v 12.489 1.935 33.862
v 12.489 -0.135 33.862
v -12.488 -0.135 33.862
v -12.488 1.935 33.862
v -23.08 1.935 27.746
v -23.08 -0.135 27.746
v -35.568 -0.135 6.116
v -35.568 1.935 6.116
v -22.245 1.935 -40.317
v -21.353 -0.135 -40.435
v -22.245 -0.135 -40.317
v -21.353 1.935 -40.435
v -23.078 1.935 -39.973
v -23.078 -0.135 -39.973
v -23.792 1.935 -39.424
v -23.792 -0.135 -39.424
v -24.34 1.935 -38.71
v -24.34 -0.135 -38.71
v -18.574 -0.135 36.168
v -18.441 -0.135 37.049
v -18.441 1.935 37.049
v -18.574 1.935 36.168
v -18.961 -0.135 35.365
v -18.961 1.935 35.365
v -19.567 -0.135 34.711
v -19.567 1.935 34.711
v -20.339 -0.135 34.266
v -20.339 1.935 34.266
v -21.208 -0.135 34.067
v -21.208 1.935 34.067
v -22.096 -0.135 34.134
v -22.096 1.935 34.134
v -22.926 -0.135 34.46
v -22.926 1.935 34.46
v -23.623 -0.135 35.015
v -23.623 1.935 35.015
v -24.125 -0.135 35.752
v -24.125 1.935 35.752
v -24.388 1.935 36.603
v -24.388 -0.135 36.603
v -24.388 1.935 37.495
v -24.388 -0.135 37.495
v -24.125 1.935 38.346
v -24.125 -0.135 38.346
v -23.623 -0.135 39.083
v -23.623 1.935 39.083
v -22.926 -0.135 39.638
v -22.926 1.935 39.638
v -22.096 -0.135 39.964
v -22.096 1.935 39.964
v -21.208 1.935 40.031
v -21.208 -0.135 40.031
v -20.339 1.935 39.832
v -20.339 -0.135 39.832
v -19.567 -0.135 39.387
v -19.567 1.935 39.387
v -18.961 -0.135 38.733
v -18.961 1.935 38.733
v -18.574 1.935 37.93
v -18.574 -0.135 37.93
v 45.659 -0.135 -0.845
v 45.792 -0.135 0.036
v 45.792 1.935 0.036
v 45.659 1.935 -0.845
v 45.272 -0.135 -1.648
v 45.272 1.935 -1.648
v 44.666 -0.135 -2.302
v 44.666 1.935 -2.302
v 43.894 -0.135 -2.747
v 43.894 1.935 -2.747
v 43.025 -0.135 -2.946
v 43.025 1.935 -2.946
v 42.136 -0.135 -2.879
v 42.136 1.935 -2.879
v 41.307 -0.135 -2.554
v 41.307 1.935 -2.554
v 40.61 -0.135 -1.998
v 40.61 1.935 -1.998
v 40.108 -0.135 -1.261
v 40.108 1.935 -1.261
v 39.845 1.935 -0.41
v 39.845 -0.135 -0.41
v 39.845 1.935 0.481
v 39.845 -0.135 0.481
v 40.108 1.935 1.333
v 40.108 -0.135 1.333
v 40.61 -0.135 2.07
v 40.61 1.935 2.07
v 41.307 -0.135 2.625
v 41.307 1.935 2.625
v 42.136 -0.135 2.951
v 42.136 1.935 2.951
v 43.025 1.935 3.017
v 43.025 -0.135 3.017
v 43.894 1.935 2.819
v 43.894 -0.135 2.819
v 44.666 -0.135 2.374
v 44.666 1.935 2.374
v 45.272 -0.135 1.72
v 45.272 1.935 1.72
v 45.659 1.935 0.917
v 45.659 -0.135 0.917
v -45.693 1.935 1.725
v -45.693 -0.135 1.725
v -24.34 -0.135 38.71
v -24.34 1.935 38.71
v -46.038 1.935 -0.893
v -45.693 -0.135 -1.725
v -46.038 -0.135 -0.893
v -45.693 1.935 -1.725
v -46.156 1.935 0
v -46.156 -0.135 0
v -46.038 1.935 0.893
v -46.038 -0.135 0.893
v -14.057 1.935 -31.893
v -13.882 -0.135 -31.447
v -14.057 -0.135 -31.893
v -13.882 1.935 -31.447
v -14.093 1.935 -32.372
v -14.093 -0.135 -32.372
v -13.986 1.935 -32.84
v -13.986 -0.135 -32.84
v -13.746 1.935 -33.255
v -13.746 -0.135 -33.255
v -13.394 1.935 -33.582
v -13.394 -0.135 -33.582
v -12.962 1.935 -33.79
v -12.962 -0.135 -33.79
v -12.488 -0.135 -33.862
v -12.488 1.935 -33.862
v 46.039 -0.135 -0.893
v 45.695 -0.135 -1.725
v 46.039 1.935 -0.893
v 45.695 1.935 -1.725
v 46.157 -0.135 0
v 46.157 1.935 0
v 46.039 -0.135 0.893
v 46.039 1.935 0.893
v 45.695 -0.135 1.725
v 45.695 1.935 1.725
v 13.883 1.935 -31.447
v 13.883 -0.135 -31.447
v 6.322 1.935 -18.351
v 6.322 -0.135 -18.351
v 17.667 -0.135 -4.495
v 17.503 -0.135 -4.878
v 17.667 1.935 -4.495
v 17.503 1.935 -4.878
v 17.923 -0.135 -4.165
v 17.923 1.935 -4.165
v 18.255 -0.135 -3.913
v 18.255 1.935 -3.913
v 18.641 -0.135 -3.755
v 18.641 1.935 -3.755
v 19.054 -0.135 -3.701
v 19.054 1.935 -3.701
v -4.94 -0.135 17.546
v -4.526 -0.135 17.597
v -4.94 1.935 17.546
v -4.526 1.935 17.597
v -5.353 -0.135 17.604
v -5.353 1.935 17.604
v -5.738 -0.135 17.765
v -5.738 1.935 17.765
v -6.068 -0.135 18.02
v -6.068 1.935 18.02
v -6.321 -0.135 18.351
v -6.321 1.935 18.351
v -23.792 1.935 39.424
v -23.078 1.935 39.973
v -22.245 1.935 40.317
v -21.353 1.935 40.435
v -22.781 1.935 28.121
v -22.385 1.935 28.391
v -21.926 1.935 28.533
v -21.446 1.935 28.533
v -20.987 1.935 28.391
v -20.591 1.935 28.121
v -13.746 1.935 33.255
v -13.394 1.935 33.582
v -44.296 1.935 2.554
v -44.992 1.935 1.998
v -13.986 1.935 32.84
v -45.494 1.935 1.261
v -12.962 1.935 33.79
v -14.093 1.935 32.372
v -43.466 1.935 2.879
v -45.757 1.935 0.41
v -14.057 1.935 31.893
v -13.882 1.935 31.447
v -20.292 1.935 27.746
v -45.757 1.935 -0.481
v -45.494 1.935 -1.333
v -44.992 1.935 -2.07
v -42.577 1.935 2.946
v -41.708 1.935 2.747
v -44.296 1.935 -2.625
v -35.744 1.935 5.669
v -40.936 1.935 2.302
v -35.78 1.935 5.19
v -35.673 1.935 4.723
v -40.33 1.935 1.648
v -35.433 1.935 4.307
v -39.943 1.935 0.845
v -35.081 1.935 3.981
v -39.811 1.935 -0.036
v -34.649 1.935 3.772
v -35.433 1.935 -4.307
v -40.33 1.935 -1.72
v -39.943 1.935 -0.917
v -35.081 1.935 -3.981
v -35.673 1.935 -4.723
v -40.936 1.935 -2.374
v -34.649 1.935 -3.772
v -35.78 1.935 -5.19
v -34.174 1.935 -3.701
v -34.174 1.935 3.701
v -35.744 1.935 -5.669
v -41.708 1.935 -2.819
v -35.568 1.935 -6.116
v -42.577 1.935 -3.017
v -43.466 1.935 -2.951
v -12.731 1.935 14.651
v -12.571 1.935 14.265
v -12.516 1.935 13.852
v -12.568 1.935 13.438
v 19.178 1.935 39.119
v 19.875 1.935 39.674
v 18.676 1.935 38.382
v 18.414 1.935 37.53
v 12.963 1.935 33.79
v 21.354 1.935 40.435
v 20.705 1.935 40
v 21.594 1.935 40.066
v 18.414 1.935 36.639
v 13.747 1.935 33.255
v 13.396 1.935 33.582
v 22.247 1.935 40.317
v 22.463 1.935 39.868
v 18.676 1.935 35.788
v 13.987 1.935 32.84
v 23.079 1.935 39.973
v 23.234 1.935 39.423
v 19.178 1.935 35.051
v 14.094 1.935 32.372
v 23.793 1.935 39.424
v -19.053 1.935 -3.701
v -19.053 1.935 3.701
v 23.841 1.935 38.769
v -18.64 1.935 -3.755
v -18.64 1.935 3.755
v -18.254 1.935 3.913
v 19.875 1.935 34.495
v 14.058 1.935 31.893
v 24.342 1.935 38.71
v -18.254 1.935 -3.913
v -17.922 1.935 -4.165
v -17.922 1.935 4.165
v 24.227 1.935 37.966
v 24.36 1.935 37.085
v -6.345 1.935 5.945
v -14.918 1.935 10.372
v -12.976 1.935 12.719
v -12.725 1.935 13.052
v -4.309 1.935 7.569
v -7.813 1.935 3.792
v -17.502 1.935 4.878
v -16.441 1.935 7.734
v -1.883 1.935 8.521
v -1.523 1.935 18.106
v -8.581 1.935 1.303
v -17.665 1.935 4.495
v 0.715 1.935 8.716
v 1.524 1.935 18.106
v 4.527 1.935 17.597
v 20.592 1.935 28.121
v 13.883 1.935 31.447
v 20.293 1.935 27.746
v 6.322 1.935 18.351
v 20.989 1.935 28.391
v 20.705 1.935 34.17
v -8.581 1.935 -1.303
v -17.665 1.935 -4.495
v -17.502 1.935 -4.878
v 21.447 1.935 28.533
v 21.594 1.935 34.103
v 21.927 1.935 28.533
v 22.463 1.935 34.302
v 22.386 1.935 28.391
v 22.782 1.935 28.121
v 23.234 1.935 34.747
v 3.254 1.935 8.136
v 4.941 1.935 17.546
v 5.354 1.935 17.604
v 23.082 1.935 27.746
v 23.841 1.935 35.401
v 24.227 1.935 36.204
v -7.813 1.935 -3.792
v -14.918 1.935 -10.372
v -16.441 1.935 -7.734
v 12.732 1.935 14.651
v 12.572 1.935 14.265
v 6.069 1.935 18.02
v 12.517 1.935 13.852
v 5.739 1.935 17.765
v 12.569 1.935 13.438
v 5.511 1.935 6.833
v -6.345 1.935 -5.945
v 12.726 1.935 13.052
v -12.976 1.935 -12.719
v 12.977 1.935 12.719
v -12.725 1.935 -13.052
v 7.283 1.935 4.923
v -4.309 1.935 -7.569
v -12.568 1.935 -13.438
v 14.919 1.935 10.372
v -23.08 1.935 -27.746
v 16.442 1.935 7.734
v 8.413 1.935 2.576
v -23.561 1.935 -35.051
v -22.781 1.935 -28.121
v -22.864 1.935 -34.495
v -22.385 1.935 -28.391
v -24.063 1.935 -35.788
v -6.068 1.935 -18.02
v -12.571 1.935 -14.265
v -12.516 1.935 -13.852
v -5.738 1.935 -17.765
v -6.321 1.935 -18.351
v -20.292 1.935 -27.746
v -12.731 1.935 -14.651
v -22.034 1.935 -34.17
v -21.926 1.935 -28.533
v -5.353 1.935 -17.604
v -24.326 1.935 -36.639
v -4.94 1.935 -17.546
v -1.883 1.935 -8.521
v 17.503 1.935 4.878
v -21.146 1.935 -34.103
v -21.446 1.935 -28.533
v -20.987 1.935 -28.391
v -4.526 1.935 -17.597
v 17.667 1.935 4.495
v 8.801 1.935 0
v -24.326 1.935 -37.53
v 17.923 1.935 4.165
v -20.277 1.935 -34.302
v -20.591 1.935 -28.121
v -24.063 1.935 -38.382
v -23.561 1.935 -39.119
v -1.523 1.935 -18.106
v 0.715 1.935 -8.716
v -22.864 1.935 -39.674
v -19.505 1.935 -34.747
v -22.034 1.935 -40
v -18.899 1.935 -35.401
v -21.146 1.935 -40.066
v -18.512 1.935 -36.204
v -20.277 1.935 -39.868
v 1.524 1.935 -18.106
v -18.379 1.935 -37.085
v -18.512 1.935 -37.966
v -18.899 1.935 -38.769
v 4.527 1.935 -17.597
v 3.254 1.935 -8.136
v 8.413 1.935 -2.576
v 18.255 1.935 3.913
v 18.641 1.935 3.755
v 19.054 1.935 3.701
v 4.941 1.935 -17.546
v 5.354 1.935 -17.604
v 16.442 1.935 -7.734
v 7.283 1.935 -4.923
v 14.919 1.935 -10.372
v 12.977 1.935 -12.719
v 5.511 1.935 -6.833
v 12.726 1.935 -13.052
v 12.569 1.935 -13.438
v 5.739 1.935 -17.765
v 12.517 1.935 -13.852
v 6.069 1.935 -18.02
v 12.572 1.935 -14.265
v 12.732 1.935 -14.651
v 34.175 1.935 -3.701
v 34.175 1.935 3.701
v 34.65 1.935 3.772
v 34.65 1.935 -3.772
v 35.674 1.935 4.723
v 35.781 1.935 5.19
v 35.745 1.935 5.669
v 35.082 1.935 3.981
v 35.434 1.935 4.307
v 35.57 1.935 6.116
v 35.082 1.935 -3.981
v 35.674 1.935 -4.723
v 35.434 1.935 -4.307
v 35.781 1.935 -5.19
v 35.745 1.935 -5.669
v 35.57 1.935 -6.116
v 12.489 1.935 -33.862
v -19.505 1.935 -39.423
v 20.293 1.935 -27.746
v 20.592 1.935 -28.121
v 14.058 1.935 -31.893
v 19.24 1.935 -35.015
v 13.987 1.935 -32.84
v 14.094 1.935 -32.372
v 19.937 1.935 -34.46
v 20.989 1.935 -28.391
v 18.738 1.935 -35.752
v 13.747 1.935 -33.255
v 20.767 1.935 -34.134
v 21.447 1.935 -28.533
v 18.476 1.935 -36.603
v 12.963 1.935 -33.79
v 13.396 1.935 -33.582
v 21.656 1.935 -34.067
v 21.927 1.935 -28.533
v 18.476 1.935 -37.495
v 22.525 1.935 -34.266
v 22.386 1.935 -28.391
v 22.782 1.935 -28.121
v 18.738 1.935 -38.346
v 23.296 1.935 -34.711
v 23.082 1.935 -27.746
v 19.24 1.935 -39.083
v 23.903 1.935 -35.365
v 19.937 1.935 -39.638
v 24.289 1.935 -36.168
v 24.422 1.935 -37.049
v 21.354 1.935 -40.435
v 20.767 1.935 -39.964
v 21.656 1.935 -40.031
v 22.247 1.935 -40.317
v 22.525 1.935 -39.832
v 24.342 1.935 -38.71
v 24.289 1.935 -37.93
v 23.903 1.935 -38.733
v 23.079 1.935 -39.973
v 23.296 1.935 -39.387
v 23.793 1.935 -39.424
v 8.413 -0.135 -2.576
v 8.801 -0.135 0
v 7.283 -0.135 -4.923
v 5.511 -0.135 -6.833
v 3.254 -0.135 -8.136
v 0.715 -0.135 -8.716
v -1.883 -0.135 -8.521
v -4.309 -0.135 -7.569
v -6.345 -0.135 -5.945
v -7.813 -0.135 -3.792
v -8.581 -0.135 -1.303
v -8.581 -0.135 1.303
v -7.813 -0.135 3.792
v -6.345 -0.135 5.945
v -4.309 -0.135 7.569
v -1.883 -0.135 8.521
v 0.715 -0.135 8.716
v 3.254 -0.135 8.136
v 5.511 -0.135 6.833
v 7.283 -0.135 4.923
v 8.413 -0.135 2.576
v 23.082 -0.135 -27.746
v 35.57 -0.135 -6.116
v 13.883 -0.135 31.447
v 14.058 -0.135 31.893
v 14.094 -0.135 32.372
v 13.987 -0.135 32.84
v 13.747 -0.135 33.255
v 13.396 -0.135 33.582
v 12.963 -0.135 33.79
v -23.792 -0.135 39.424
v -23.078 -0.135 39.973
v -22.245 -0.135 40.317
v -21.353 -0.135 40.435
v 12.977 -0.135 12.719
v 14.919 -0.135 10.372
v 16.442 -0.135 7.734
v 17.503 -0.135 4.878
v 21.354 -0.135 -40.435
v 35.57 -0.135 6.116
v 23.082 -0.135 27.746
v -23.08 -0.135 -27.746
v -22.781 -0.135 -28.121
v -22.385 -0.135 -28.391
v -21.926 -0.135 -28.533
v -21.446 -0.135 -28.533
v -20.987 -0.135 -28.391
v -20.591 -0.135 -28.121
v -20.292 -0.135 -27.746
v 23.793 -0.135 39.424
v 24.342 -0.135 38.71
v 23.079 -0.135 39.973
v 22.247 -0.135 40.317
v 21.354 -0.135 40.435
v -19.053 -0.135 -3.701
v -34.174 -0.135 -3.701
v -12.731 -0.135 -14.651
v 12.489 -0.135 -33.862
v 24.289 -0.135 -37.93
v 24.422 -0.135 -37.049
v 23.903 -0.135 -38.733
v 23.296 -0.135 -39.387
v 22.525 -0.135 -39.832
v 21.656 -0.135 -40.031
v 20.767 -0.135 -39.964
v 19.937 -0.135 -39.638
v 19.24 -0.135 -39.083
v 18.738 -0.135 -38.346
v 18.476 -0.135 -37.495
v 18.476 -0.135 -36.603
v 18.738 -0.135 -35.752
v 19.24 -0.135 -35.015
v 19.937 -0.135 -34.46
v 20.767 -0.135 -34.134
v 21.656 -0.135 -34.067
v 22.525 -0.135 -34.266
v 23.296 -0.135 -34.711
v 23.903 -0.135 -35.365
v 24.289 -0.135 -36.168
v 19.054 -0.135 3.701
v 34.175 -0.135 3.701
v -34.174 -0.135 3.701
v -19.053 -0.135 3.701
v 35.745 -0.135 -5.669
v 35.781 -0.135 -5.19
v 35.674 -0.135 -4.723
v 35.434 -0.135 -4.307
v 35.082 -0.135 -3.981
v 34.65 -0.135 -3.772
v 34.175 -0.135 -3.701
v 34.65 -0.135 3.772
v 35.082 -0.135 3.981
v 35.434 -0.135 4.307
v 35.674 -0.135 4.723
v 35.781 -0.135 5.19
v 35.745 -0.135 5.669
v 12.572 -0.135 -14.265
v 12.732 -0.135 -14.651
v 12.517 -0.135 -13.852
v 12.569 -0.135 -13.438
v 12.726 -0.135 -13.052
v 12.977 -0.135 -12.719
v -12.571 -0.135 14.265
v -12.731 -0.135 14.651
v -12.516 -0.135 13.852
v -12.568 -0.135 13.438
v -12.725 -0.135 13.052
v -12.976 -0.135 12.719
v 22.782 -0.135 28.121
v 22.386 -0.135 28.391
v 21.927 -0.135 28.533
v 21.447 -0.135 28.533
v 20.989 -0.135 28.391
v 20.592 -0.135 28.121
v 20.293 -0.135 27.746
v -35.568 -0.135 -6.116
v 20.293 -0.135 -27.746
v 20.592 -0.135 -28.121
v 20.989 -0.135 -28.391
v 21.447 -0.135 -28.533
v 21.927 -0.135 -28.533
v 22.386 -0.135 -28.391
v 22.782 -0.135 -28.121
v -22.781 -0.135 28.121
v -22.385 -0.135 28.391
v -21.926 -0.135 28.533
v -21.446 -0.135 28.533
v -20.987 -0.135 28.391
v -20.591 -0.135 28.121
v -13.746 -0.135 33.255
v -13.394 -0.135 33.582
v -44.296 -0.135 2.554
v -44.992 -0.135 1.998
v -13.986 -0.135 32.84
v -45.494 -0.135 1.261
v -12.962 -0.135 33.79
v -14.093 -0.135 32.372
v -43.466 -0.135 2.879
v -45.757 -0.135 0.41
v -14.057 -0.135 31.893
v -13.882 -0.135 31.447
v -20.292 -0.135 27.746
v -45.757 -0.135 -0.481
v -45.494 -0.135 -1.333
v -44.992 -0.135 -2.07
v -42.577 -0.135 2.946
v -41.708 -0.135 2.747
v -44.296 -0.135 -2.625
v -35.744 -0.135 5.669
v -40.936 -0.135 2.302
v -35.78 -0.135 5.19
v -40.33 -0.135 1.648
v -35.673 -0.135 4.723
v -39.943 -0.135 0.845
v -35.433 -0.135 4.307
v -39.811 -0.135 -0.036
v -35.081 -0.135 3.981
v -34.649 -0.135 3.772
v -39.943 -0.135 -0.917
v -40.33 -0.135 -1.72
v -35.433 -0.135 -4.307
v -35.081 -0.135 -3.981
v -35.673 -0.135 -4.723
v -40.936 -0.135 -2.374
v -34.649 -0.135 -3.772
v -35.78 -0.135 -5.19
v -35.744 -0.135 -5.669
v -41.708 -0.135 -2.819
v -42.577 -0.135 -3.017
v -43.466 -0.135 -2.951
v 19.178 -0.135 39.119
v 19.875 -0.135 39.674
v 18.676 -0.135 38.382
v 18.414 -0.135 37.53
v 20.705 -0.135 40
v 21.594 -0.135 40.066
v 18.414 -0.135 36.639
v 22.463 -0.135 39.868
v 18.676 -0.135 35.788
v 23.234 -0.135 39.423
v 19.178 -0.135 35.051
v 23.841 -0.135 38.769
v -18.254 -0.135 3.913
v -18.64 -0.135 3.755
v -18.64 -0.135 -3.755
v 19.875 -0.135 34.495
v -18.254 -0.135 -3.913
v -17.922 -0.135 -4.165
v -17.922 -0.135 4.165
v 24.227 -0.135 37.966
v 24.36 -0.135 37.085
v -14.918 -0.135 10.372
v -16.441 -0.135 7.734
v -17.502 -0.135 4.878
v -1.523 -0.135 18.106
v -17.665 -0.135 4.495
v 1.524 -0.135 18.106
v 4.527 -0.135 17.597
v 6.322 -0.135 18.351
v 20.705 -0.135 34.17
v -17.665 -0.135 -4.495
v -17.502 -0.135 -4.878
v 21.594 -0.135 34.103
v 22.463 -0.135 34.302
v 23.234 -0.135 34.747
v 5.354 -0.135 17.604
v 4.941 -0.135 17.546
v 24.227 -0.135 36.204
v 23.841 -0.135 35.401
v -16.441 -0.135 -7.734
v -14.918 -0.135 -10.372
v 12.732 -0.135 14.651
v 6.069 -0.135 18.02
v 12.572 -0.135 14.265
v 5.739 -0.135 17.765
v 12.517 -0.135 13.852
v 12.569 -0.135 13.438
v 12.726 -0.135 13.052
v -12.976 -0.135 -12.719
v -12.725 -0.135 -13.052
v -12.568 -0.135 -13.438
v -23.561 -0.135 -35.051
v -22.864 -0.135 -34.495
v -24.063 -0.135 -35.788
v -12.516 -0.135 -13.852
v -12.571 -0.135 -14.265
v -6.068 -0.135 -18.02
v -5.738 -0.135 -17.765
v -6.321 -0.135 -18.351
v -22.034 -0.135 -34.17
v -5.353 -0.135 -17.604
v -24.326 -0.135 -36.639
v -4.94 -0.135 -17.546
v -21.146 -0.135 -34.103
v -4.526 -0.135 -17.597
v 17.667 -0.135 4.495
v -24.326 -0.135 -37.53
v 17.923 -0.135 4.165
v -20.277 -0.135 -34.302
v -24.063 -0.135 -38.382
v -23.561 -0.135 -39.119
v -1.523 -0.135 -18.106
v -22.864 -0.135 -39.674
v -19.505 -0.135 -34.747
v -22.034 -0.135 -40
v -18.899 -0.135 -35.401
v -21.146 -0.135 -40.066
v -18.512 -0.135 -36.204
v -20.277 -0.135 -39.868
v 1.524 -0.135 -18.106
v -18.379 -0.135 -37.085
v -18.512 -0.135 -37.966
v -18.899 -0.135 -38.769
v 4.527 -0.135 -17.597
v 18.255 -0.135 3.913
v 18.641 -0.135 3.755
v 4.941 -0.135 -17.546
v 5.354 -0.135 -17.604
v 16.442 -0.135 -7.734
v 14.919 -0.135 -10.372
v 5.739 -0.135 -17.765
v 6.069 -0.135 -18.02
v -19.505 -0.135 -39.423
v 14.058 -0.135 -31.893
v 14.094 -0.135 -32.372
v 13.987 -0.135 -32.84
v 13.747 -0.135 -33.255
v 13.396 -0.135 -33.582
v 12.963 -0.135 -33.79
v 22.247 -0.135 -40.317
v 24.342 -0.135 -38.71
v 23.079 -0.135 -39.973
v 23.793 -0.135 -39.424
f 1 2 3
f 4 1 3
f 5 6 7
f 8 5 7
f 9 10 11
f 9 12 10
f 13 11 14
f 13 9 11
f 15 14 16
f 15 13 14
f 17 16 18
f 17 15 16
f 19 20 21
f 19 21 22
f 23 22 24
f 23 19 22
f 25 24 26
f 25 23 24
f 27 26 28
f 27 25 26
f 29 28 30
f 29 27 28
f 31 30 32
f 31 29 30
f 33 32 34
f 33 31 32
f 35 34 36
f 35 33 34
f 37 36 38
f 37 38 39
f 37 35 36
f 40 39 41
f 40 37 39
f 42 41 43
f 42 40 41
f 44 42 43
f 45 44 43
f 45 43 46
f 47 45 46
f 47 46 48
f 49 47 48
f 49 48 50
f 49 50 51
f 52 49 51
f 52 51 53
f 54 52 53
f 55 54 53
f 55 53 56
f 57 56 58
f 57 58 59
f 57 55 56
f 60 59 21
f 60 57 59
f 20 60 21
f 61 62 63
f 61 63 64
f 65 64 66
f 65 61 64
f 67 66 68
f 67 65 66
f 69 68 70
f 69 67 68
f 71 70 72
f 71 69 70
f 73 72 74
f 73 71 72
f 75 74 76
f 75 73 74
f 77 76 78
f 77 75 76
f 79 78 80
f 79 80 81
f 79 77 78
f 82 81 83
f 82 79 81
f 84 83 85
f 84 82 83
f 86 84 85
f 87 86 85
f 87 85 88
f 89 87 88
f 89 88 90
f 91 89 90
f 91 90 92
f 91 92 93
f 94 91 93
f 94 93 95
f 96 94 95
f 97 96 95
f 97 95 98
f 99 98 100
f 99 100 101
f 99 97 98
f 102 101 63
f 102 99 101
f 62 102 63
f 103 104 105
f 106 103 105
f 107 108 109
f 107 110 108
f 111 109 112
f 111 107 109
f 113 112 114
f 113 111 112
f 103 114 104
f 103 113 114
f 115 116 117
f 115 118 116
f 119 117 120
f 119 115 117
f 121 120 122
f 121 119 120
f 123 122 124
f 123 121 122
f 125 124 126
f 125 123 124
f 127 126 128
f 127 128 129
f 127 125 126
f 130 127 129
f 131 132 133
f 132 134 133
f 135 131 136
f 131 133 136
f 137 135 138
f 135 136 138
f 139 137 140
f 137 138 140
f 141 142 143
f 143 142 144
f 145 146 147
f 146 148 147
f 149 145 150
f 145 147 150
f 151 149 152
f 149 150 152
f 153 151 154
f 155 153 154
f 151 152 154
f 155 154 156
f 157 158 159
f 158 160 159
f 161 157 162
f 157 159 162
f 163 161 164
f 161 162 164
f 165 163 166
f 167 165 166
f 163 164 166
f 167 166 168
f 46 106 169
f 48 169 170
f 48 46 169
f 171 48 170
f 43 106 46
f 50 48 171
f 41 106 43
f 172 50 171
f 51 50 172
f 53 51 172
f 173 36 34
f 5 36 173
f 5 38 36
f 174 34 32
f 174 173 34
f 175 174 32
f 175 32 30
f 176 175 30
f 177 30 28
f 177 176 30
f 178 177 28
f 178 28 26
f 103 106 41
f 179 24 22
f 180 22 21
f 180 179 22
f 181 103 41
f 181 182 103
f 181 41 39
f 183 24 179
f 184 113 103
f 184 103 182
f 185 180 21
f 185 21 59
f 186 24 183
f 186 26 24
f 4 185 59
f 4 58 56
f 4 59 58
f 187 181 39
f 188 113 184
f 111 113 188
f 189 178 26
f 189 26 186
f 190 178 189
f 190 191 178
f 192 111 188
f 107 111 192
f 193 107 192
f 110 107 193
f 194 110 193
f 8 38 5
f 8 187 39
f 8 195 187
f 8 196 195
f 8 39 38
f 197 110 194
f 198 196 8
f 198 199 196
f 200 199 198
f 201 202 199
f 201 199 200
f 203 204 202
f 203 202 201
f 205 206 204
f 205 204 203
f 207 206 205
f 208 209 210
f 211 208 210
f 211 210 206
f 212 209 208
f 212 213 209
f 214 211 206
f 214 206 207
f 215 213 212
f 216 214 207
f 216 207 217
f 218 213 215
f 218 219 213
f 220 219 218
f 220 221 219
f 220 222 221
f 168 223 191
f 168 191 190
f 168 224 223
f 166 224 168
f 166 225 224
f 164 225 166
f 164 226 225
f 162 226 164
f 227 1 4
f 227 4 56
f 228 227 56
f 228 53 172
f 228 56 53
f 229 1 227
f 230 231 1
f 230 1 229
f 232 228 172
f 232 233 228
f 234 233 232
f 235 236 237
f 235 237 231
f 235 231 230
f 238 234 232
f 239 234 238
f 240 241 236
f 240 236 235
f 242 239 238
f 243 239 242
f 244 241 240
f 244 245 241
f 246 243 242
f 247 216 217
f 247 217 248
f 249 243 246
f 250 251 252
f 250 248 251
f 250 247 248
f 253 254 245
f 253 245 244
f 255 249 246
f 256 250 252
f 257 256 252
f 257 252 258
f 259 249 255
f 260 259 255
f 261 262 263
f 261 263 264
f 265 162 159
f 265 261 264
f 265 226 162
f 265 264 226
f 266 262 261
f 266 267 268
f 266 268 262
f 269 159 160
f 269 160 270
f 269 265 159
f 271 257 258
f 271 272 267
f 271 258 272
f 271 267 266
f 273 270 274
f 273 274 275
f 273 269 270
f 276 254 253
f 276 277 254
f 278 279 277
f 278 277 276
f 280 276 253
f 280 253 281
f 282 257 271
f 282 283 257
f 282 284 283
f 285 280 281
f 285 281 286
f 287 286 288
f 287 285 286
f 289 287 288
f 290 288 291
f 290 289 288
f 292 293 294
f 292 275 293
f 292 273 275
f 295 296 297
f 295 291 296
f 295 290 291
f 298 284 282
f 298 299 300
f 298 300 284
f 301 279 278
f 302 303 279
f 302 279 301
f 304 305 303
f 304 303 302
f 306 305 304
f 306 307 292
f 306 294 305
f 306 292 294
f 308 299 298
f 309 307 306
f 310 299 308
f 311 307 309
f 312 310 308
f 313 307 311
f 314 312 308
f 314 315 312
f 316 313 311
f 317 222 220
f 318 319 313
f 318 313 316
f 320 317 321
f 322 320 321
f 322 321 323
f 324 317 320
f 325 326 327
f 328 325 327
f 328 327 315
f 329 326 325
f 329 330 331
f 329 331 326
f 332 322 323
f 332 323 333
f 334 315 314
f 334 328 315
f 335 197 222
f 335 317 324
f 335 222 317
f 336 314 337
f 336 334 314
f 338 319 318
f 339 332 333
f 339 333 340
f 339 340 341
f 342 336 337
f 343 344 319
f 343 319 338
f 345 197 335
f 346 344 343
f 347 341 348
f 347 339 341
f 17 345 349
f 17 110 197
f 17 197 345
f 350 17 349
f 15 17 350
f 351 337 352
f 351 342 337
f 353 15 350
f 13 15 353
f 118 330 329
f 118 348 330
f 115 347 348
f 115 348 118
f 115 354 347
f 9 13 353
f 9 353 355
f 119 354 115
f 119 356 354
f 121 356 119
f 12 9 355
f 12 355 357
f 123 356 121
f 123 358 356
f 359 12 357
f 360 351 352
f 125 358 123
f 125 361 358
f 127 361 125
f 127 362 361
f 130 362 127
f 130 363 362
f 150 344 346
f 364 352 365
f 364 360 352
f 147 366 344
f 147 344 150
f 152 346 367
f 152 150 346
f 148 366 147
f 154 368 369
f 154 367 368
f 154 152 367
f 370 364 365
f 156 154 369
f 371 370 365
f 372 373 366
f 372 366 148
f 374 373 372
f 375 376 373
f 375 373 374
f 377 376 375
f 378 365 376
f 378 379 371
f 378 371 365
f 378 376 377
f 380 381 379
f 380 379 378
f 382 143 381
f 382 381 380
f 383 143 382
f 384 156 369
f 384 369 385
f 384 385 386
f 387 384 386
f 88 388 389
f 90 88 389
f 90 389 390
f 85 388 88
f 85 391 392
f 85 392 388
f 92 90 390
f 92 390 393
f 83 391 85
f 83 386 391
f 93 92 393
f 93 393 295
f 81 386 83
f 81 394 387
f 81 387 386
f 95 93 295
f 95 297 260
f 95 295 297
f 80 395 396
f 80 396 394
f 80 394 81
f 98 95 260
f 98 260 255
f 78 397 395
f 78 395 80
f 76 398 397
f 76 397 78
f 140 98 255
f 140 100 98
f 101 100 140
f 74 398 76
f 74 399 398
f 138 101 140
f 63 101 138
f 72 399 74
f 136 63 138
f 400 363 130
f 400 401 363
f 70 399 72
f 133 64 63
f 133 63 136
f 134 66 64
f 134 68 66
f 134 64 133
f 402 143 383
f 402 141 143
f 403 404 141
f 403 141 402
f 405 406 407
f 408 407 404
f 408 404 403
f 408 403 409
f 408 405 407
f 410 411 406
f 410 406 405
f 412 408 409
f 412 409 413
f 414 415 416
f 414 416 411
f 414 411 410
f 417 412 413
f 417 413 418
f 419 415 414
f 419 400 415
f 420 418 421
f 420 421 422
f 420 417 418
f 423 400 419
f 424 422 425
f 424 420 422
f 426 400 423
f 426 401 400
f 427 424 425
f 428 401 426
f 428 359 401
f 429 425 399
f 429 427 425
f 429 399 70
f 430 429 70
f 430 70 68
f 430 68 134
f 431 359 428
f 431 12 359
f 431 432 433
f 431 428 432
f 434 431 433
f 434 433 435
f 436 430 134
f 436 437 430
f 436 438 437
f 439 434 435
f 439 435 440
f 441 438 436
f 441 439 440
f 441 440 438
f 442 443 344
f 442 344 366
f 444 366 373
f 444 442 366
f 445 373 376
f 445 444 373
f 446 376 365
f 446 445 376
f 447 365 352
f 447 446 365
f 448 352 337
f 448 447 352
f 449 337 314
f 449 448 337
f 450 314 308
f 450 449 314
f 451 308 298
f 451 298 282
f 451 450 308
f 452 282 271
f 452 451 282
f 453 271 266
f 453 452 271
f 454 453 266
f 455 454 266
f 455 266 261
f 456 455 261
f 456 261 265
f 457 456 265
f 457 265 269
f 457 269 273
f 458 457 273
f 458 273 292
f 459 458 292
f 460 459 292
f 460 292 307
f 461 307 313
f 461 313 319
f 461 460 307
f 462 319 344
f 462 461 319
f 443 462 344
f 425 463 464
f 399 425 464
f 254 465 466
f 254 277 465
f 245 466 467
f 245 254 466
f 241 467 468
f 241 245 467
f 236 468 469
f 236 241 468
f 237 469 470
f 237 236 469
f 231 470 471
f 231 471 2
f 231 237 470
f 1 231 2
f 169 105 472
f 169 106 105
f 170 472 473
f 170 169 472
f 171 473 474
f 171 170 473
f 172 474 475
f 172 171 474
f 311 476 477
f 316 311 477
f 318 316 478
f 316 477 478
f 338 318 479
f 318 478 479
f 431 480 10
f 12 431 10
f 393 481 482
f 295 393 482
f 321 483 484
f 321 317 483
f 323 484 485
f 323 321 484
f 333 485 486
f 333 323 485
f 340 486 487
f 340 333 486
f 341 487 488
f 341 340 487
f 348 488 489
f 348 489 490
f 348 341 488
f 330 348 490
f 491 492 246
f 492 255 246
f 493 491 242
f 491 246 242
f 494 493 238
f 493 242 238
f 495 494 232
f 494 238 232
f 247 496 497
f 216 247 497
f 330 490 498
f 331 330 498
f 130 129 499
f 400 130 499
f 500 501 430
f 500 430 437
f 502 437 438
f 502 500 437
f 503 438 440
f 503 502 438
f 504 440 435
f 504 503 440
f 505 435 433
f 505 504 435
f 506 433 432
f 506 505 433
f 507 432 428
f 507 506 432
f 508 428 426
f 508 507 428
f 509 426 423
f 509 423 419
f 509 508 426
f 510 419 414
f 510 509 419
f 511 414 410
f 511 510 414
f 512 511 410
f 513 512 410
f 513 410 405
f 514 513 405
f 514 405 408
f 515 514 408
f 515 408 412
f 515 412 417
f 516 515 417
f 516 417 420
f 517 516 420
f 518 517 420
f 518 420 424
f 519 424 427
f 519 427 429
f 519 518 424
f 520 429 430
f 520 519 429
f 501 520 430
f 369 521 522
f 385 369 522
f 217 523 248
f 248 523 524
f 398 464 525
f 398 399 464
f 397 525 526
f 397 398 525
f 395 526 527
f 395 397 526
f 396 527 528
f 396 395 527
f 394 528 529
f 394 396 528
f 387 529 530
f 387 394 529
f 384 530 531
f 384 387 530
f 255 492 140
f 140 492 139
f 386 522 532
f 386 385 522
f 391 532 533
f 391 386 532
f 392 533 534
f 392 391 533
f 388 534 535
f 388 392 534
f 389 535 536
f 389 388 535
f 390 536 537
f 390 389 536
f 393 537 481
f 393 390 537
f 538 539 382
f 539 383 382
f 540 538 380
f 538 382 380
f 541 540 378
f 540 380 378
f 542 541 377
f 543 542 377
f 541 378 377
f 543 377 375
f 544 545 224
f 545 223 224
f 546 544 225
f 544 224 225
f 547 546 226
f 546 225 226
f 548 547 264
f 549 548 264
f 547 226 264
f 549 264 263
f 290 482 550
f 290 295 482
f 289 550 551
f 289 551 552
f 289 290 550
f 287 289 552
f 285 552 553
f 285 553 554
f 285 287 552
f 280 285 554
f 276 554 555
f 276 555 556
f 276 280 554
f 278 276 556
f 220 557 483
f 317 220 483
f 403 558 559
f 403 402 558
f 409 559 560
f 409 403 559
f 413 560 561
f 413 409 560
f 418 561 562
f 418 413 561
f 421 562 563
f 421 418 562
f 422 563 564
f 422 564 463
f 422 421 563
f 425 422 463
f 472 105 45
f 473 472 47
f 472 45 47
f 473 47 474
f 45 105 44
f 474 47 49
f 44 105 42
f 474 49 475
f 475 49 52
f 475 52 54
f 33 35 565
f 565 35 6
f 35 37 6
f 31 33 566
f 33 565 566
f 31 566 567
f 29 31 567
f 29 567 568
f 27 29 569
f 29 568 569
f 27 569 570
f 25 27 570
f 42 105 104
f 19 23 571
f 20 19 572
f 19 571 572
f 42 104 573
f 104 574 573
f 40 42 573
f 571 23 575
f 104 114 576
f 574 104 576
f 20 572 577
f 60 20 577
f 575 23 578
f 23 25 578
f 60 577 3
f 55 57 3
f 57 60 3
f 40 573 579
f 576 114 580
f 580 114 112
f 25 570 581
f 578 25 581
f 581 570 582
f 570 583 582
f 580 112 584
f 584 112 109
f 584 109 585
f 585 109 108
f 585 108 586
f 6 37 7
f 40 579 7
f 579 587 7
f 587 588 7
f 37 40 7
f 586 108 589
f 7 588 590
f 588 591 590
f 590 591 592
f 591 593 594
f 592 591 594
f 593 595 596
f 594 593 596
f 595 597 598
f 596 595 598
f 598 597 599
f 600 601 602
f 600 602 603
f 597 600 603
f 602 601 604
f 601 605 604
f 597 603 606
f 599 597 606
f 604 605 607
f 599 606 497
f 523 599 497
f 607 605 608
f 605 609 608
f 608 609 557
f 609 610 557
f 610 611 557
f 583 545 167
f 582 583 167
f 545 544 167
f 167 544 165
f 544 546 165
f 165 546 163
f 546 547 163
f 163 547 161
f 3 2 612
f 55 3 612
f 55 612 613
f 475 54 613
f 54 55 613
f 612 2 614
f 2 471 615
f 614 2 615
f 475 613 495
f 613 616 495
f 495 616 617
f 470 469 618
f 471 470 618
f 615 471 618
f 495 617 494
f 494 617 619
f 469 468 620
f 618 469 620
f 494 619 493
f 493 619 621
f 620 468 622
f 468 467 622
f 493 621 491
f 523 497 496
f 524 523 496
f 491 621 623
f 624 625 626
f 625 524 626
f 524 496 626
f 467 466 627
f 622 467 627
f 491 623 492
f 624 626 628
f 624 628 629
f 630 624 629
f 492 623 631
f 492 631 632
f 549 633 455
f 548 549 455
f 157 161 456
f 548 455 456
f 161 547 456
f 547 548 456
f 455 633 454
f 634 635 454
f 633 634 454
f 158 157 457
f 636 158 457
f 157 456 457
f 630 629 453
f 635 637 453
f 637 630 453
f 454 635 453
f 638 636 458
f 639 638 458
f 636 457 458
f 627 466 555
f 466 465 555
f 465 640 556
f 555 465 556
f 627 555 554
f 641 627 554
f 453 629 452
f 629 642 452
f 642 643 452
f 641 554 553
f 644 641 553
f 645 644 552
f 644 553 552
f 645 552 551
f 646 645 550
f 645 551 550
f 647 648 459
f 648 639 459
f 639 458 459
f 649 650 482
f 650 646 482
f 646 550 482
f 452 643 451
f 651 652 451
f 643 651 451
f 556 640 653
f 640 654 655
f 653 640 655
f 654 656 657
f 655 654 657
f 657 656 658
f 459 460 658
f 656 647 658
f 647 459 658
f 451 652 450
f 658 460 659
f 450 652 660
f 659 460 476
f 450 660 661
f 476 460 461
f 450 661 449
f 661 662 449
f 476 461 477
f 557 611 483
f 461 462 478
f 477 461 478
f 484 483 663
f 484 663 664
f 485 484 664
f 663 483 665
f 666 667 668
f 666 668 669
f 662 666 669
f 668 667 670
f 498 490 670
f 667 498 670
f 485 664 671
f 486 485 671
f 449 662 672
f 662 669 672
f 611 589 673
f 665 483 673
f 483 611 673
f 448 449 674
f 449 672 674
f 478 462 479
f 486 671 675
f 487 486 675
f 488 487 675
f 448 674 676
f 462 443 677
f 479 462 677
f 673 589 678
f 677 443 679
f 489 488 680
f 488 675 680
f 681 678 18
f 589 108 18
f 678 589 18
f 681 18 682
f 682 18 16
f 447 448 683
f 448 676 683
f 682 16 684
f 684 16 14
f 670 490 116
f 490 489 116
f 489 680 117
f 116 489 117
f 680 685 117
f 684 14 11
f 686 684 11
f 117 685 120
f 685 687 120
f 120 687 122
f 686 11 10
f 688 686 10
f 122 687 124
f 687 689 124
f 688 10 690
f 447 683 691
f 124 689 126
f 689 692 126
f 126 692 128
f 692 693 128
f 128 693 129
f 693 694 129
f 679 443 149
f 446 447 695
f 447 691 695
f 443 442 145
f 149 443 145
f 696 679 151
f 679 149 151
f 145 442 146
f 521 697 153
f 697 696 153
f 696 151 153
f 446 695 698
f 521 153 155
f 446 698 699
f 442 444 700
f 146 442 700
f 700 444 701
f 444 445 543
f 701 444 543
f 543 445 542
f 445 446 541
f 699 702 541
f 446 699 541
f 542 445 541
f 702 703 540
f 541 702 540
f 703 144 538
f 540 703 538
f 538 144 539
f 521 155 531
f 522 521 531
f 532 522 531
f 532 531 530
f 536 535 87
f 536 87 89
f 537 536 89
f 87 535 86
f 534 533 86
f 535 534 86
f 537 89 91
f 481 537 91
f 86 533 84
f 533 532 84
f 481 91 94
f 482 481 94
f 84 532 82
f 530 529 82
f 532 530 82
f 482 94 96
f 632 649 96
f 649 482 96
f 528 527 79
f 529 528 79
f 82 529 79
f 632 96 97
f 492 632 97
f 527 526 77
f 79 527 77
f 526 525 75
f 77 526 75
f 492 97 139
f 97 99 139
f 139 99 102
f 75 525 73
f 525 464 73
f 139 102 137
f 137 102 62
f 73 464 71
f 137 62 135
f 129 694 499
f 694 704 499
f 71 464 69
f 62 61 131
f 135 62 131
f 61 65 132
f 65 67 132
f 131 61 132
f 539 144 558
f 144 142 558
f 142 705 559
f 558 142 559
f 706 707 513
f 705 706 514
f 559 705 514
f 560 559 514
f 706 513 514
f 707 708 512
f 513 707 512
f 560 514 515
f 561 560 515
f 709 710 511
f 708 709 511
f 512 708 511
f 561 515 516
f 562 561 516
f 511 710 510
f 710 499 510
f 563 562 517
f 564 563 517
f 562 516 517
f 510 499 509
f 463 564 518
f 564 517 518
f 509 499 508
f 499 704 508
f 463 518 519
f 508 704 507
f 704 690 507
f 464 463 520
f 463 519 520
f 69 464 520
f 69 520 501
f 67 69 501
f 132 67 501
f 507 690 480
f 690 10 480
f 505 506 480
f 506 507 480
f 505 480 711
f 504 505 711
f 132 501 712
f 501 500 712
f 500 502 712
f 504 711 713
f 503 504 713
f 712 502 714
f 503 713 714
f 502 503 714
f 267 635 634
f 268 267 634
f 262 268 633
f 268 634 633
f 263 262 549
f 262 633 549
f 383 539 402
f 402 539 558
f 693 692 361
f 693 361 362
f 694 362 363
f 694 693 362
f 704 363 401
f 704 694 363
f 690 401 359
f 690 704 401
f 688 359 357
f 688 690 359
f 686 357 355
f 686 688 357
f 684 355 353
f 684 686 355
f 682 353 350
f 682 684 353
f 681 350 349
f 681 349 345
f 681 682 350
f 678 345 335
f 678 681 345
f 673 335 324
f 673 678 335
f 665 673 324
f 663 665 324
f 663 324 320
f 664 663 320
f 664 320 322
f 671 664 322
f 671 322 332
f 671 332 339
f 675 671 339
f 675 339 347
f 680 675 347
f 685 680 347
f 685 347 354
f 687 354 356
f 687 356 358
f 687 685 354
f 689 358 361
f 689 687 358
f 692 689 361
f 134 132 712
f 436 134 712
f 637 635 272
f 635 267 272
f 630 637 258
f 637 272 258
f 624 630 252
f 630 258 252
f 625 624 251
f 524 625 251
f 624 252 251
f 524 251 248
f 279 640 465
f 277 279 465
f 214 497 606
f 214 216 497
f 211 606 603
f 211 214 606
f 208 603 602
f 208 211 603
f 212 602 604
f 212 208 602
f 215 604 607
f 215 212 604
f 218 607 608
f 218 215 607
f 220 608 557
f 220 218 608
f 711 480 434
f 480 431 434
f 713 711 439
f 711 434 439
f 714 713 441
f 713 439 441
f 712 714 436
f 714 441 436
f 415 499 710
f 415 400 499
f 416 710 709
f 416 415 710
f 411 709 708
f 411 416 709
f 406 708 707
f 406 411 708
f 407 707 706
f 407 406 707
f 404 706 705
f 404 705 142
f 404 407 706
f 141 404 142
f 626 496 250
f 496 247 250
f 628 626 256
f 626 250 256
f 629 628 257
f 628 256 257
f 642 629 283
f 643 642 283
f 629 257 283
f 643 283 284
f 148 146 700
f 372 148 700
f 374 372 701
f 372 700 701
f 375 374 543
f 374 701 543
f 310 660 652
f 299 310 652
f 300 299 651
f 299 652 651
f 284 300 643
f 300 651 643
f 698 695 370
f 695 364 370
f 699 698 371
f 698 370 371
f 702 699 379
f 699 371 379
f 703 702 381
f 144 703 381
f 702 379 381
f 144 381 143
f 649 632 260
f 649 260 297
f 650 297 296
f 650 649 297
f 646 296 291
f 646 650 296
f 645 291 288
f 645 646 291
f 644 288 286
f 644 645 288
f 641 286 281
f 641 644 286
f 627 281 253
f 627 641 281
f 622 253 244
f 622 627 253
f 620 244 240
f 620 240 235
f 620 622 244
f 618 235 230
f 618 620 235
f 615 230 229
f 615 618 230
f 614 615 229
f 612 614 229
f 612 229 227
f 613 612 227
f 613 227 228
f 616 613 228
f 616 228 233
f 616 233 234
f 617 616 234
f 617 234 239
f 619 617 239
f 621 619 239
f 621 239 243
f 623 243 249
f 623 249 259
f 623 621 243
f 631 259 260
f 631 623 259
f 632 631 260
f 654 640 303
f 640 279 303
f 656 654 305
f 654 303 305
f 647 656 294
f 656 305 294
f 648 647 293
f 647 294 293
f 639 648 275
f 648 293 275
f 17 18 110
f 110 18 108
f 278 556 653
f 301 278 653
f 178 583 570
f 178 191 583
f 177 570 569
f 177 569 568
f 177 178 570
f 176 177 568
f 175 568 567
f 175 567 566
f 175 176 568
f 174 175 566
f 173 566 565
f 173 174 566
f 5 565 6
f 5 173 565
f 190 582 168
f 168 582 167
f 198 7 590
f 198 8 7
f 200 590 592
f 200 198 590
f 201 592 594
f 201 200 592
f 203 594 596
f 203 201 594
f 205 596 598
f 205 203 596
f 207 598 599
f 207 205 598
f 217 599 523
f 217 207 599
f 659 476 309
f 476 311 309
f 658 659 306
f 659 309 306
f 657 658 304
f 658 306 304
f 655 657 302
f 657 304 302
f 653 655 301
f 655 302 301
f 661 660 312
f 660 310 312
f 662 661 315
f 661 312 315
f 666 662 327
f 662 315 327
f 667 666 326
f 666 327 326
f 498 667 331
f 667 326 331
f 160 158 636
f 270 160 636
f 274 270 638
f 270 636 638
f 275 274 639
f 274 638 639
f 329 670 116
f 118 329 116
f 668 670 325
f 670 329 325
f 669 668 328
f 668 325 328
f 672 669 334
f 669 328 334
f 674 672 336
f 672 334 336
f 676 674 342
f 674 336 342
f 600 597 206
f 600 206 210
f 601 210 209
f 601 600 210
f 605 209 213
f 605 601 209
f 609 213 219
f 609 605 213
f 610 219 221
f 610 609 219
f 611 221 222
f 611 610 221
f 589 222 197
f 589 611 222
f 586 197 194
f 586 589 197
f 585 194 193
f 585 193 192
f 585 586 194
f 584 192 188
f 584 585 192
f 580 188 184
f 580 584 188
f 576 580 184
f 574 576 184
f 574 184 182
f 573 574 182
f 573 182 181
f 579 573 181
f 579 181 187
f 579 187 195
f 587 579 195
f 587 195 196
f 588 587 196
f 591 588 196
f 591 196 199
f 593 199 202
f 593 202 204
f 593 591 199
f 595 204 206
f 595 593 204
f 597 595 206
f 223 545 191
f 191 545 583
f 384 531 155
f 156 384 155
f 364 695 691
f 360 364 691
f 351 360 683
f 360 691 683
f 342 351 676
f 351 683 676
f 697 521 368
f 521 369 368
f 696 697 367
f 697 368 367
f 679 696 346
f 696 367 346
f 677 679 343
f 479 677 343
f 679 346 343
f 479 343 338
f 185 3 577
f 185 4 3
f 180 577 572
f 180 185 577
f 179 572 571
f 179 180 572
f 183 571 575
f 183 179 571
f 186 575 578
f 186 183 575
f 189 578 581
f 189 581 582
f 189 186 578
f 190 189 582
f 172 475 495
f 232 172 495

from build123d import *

# Parameters (mm, degrees)
SKETCH1_R           = 2.6
SKETCH1_R_2         = 7.6
BOSS_EXTRUDE1_DEPTH = 1.8
FILLET1_R           = 3
FILLET2_R           = 1.4
SCALE1_SCALE        = 1.15


with BuildPart() as part:
    # Sketch1 → Boss-Extrude1 (new body)
    with BuildSketch(Plane(origin=(0, 0, 0), x_dir=(1, 0, 0), z_dir=(0, 1, 0))):
        Polygon((20.3, 35.160631394), (-20.3, 35.160631394), (-40.6, 0), (-20.3, -35.160631394), (20.3, -35.160631394), (40.6, 0), align=None)
        with Locations((-18.636201283, -32.21652123)):
            Circle(SKETCH1_R, mode=Mode.SUBTRACT)
        with Locations((18.582225165, -32.247684356)):
            Circle(SKETCH1_R, mode=Mode.SUBTRACT)
        with Locations((37.218426448, -0.031163126)):
            Circle(SKETCH1_R, mode=Mode.SUBTRACT)
        with Locations((-37.218426448, 0.031163126)):
            Circle(SKETCH1_R, mode=Mode.SUBTRACT)
        with BuildLine():
            Line((-32.142053523, 3.218057696), (-18.857946477, 26.226806032))
            Line((-18.857946477, 26.226806032), (-10.521325069, 11.78735419))
            ThreePointArc((-10.521325069, 11.78735419), (-13.68320138, 7.9), (-15.468810706, 3.218057696))
            Line((-15.468810706, 3.218057696), (-32.142053523, 3.218057696))
        make_face(mode=Mode.SUBTRACT)
        with BuildLine():
            Line((-18.857946477, -26.226806032), (-32.142053523, -3.218057696))
            Line((-32.142053523, -3.218057696), (-15.468810706, -3.218057696))
            ThreePointArc((-15.468810706, -3.218057696), (-13.68320138, -7.9), (-10.521325069, -11.78735419))
            Line((-10.521325069, -11.78735419), (-18.857946477, -26.226806032))
        make_face(mode=Mode.SUBTRACT)
        with BuildLine():
            Line((13.284107046, -29.444863729), (-13.284107046, -29.444863729))
            Line((-13.284107046, -29.444863729), (-4.947485637, -15.005411886))
            ThreePointArc((-4.947485637, -15.005411886), (0, -15.8), (4.947485637, -15.005411886))
            Line((4.947485637, -15.005411886), (13.284107046, -29.444863729))
        make_face(mode=Mode.SUBTRACT)
        with BuildLine():
            Line((32.142053523, -3.218057696), (18.857946477, -26.226806032))
            Line((18.857946477, -26.226806032), (10.521325069, -11.78735419))
            ThreePointArc((10.521325069, -11.78735419), (13.68320138, -7.9), (15.468810706, -3.218057696))
            Line((15.468810706, -3.218057696), (32.142053523, -3.218057696))
        make_face(mode=Mode.SUBTRACT)
        with BuildLine():
            Line((18.857946477, 26.226806032), (32.142053523, 3.218057696))
            Line((32.142053523, 3.218057696), (15.468810706, 3.218057696))
            ThreePointArc((15.468810706, 3.218057696), (13.68320138, 7.9), (10.521325069, 11.78735419))
            Line((10.521325069, 11.78735419), (18.857946477, 26.226806032))
        make_face(mode=Mode.SUBTRACT)
        with BuildLine():
            Line((-13.284107046, 29.444863729), (13.284107046, 29.444863729))
            Line((13.284107046, 29.444863729), (4.947485637, 15.005411886))
            ThreePointArc((4.947485637, 15.005411886), (0, 15.8), (-4.947485637, 15.005411886))
            Line((-4.947485637, 15.005411886), (-13.284107046, 29.444863729))
        make_face(mode=Mode.SUBTRACT)
        with Locations((-18.582225165, 32.247684356)):
            Circle(SKETCH1_R, mode=Mode.SUBTRACT)
        with Locations((18.636201283, 32.21652123)):
            Circle(SKETCH1_R, mode=Mode.SUBTRACT)
        with Locations((0.052857117, 0)):
            Circle(SKETCH1_R_2, mode=Mode.SUBTRACT)
    extrude(amount=BOSS_EXTRUDE1_DEPTH)

    # Fillet1
    fillet1_edges = [part.edges().sort_by_distance(p)[0] for p in [
        (40.6, 0.9, 0),
        (20.3, 0.9, 35.160631394),
        (-20.3, 0.9, 35.160631394),
        (-40.6, 0.9, 0),
        (-20.3, 0.9, -35.160631394),
        (20.3, 0.9, -35.160631394),
    ]]
    fillet(fillet1_edges, radius=FILLET1_R)

    # Fillet2
    fillet2_edges = [part.edges().sort_by_distance(p)[0] for p in [
        (-32.142053523, 0.9, -3.218057696),
        (-15.468810706, 0.9, -3.218057696),
        (-10.521325069, 0.9, -11.78735419),
        (-18.857946477, 0.9, -26.226806032),
        (-18.857946477, 0.9, 26.226806032),
        (-10.521325069, 0.9, 11.78735419),
        (-15.468810706, 0.9, 3.218057696),
        (-32.142053523, 0.9, 3.218057696),
        (13.284107046, 0.9, 29.444863729),
        (4.947485637, 0.9, 15.005411886),
        (-4.947485637, 0.9, 15.005411886),
        (-13.284107046, 0.9, 29.444863729),
        (32.142053523, 0.9, 3.218057696),
        (15.468810706, 0.9, 3.218057696),
        (10.521325069, 0.9, 11.78735419),
        (18.857946477, 0.9, 26.226806032),
        (18.857946477, 0.9, -26.226806032),
        (10.521325069, 0.9, -11.78735419),
        (15.468810706, 0.9, -3.218057696),
        (32.142053523, 0.9, -3.218057696),
        (-13.284107046, 0.9, -29.444863729),
        (-4.947485637, 0.9, -15.005411886),
        (4.947485637, 0.9, -15.005411886),
        (13.284107046, 0.9, -29.444863729),
    ]]
    fillet(fillet2_edges, radius=FILLET2_R)


with BuildPart() as part_1:
    # Scale1: scaled about (-0.003928135, 0.9, 0)
    add(part.part.scale(SCALE1_SCALE).moved(Location((0.00058922, -0.135, 0))))


solid = part_1.part
